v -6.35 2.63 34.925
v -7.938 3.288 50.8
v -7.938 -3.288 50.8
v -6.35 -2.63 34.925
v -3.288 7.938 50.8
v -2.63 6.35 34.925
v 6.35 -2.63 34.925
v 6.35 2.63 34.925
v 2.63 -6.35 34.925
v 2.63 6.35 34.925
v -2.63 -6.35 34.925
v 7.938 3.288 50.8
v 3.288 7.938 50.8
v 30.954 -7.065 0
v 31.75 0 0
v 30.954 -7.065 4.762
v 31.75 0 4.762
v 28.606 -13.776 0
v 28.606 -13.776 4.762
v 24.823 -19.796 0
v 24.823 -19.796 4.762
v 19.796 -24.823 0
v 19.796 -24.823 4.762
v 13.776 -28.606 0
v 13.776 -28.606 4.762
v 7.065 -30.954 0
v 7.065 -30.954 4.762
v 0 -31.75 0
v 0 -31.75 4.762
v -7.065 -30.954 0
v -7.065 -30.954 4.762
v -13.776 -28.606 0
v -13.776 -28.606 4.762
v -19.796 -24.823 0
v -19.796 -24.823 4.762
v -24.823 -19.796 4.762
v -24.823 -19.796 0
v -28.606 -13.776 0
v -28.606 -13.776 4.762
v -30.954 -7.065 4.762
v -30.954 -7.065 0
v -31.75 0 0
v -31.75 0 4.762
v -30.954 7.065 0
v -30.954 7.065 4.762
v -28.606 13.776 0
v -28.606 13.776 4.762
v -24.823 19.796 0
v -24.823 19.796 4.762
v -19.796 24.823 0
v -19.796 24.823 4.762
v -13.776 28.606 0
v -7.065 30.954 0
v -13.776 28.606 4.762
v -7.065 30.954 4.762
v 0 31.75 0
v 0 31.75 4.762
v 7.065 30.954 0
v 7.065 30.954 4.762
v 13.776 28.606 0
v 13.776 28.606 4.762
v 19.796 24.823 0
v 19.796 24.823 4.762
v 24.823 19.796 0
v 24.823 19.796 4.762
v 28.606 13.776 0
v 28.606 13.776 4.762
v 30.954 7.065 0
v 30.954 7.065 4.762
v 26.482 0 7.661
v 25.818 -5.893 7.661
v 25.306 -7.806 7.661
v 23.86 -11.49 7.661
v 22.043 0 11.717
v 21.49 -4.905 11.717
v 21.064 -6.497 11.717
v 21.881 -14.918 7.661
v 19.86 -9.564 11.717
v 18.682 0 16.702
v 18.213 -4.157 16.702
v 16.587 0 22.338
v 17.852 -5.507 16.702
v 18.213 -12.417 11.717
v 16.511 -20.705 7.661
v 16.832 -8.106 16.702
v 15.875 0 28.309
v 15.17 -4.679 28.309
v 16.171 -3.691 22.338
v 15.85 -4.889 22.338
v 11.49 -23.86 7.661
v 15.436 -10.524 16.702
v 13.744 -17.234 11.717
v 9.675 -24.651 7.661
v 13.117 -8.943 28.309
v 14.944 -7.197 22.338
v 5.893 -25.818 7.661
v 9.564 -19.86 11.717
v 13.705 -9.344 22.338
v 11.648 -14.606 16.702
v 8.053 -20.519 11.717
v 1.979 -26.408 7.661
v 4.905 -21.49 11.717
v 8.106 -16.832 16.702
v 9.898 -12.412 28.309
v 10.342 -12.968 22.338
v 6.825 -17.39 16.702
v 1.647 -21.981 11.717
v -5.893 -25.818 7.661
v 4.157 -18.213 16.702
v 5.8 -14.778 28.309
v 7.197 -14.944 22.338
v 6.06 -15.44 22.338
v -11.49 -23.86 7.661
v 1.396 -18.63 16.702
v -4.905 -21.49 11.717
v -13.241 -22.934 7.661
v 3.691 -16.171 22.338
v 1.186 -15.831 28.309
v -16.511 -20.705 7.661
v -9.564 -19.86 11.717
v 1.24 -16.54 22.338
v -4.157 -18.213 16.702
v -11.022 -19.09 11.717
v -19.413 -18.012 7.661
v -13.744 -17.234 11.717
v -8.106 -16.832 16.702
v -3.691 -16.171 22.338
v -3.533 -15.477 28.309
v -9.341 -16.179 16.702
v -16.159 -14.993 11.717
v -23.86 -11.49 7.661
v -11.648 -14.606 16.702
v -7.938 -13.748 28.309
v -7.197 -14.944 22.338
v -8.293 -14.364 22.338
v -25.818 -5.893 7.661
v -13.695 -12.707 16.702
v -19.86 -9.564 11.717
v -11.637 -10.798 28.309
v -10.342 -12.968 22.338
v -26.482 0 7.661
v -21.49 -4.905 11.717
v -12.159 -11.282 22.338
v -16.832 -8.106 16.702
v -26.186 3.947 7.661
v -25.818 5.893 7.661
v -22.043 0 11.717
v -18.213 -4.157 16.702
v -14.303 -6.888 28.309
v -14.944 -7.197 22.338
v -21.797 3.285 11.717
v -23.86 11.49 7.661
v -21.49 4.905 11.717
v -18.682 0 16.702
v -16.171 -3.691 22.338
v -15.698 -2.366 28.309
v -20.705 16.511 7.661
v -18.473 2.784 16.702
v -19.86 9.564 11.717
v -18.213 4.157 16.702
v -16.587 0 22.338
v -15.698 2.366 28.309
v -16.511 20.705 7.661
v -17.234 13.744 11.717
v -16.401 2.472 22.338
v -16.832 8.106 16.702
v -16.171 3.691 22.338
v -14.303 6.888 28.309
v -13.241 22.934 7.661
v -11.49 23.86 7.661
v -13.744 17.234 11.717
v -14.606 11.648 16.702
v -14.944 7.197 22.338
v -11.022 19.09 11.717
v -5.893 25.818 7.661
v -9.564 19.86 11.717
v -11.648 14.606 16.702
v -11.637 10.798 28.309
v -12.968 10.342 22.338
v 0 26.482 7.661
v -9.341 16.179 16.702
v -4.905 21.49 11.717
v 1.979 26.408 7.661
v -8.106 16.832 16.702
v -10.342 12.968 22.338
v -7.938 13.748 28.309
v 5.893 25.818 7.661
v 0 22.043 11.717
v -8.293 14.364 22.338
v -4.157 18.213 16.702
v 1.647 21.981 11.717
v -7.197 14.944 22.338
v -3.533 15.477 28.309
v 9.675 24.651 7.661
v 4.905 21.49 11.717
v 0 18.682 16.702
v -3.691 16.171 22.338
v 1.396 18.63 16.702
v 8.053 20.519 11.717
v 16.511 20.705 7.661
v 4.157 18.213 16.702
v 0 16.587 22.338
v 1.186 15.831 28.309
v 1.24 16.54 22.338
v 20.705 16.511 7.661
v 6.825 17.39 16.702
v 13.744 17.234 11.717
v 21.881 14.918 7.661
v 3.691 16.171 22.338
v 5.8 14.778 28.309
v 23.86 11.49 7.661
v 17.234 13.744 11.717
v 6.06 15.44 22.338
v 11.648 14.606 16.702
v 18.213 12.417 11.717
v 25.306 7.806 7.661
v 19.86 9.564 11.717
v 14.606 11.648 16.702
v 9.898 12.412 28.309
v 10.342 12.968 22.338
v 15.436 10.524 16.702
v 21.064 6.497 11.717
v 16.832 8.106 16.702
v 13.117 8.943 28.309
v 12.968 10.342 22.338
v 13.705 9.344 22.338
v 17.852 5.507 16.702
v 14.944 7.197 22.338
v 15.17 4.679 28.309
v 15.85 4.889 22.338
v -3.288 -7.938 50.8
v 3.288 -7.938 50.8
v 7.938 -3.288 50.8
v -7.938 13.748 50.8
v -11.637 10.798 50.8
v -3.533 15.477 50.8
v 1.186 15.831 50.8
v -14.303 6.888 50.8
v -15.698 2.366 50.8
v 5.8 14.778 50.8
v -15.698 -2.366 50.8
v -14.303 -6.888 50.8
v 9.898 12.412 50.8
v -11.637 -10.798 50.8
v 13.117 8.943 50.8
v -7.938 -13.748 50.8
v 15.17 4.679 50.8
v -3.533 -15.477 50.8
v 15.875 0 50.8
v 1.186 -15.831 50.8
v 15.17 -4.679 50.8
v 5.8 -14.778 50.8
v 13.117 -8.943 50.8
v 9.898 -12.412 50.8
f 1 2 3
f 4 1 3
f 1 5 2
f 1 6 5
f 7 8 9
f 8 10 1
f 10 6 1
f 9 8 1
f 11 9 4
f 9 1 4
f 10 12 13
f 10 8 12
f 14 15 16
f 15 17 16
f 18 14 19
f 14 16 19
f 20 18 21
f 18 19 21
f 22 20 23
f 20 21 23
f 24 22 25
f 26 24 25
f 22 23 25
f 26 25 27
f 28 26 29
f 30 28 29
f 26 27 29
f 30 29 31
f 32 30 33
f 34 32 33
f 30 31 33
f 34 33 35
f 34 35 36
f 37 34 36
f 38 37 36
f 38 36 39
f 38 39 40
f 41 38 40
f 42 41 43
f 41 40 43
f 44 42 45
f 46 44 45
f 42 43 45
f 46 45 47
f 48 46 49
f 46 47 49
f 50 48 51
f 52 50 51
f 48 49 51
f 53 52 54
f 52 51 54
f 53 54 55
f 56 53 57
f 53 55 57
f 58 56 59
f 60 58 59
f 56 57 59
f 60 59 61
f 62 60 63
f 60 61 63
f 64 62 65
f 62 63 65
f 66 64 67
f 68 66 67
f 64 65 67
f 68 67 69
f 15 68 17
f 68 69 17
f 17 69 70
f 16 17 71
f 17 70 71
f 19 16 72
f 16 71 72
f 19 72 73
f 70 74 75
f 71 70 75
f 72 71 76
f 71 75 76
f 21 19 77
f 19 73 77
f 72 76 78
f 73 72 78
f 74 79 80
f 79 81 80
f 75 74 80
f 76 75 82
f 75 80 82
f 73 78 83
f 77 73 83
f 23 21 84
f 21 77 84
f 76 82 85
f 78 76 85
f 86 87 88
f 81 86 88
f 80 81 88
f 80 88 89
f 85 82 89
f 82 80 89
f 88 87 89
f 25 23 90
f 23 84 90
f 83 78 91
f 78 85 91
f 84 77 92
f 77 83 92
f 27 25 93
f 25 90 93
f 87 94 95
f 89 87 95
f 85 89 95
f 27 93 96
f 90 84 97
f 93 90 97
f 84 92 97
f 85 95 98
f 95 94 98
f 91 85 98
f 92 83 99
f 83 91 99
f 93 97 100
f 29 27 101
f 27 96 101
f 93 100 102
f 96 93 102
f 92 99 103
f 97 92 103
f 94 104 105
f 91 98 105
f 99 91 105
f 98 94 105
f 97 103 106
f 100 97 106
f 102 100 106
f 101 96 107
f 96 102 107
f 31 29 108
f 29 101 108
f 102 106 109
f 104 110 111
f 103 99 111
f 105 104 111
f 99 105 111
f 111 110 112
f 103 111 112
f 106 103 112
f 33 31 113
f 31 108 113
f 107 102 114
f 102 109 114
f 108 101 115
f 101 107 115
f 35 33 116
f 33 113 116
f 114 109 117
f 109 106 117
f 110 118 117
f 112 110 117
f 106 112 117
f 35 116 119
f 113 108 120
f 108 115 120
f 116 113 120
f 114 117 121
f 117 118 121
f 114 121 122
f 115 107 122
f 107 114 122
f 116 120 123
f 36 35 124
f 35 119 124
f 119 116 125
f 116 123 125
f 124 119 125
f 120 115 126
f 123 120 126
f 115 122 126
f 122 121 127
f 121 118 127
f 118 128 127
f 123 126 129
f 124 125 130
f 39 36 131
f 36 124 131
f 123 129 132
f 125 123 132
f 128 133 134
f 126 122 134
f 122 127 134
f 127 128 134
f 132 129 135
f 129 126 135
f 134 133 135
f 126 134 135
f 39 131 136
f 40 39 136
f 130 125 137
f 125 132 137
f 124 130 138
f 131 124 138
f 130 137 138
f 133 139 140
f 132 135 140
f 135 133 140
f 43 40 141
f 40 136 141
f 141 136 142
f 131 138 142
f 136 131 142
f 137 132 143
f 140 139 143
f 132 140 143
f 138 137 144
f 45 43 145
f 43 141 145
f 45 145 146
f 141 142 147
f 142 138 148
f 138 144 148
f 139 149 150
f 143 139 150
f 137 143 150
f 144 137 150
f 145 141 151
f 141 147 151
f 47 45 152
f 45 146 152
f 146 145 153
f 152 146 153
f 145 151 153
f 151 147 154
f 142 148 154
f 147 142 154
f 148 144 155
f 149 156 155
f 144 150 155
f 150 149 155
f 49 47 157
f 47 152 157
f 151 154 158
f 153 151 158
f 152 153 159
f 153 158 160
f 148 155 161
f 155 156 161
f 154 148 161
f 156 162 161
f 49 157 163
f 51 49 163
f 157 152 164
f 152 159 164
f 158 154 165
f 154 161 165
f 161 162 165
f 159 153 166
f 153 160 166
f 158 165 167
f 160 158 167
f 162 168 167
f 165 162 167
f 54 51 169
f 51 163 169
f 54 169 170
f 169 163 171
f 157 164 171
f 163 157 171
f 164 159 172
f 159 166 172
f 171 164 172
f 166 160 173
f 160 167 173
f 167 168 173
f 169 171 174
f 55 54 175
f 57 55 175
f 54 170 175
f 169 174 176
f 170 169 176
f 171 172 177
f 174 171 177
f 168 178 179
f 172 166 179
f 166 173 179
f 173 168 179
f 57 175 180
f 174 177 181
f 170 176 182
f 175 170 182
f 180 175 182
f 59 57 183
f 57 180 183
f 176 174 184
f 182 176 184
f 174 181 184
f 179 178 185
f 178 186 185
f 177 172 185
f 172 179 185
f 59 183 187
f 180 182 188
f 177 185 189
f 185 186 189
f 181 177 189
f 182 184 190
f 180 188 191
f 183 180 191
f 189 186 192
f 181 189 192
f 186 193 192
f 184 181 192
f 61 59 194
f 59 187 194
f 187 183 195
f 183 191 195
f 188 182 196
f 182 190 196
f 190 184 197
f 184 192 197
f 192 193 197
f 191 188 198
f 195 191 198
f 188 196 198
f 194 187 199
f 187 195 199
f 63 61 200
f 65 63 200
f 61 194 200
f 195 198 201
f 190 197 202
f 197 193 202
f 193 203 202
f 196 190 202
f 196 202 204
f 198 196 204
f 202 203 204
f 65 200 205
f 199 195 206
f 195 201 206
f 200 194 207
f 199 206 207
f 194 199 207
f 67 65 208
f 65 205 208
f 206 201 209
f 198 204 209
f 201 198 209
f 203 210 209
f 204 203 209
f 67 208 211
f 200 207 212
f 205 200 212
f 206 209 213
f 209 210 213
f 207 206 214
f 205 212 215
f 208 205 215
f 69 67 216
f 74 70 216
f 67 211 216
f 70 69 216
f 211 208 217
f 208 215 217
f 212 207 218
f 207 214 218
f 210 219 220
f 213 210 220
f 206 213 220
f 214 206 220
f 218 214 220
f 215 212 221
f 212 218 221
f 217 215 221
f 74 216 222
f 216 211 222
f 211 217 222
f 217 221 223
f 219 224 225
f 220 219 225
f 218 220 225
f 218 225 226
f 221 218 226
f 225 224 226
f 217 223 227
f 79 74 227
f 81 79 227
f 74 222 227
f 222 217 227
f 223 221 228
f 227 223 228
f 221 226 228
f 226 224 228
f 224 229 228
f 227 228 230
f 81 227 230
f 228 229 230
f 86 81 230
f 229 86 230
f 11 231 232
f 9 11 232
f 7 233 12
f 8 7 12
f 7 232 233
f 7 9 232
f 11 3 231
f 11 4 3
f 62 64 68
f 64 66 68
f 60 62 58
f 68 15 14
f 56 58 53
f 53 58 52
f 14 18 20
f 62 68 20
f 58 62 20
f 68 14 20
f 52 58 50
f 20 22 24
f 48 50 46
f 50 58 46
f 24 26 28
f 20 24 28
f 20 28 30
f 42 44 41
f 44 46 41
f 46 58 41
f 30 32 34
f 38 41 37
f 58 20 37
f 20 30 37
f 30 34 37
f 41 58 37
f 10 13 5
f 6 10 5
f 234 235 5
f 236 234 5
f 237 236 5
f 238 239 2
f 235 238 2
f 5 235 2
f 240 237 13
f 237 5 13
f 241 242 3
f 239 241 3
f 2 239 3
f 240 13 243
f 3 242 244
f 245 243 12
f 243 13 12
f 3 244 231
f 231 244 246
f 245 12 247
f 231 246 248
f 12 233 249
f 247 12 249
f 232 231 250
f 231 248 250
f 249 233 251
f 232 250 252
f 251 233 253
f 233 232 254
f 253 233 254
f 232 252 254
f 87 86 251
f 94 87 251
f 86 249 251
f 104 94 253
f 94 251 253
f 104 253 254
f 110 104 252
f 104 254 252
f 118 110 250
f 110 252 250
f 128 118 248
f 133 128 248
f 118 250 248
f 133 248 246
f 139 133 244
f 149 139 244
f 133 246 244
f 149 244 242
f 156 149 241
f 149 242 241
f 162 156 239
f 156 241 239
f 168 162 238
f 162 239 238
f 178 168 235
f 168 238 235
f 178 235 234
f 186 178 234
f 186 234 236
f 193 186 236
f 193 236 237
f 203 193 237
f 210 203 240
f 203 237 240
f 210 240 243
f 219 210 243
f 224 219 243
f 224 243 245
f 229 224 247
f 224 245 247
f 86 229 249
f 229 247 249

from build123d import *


with BuildPart() as f1:
    # F0 (on Front) → F1 (revolve)
    with BuildSketch(Plane.XZ):
        with BuildLine():
            Line((0, 50.8), (0, 0))
            Line((0, 0), (31.75, 0))
            Line((31.75, 0), (31.75, 4.7625))
            ThreePointArc((31.75, 4.7625), (20.214433, 14.109899), (15.875, 28.30893))
            Line((15.875, 28.30893), (15.875, 50.8))
            Line((15.875, 50.8), (0, 50.8))
        make_face()
    revolve(axis=Axis((0, 0, 25.4), (0, 0, -1)))

    # F2 (on face) → F5 section 0
    with BuildSketch(Plane.XY.offset(50.8)):
        Polygon((3.28782, 7.9375), (-3.28782, 7.9375), (-7.9375, 3.28782), (-7.9375, -3.28782), (-3.28782, -7.9375), (3.28782, -7.9375), (7.9375, -3.28782), (7.9375, 3.28782), align=None)
    # F4 (on offset) → F5 section 1
    with BuildSketch(Plane.XY.offset(34.925)):
        Polygon((2.630256, 6.35), (-2.630256, 6.35), (-6.35, 2.630256), (-6.35, -2.630256), (-2.630256, -6.35), (2.630256, -6.35), (6.35, -2.630256), (6.35, 2.630256), align=None)
    loft(mode=Mode.SUBTRACT)


solid = f1.part
